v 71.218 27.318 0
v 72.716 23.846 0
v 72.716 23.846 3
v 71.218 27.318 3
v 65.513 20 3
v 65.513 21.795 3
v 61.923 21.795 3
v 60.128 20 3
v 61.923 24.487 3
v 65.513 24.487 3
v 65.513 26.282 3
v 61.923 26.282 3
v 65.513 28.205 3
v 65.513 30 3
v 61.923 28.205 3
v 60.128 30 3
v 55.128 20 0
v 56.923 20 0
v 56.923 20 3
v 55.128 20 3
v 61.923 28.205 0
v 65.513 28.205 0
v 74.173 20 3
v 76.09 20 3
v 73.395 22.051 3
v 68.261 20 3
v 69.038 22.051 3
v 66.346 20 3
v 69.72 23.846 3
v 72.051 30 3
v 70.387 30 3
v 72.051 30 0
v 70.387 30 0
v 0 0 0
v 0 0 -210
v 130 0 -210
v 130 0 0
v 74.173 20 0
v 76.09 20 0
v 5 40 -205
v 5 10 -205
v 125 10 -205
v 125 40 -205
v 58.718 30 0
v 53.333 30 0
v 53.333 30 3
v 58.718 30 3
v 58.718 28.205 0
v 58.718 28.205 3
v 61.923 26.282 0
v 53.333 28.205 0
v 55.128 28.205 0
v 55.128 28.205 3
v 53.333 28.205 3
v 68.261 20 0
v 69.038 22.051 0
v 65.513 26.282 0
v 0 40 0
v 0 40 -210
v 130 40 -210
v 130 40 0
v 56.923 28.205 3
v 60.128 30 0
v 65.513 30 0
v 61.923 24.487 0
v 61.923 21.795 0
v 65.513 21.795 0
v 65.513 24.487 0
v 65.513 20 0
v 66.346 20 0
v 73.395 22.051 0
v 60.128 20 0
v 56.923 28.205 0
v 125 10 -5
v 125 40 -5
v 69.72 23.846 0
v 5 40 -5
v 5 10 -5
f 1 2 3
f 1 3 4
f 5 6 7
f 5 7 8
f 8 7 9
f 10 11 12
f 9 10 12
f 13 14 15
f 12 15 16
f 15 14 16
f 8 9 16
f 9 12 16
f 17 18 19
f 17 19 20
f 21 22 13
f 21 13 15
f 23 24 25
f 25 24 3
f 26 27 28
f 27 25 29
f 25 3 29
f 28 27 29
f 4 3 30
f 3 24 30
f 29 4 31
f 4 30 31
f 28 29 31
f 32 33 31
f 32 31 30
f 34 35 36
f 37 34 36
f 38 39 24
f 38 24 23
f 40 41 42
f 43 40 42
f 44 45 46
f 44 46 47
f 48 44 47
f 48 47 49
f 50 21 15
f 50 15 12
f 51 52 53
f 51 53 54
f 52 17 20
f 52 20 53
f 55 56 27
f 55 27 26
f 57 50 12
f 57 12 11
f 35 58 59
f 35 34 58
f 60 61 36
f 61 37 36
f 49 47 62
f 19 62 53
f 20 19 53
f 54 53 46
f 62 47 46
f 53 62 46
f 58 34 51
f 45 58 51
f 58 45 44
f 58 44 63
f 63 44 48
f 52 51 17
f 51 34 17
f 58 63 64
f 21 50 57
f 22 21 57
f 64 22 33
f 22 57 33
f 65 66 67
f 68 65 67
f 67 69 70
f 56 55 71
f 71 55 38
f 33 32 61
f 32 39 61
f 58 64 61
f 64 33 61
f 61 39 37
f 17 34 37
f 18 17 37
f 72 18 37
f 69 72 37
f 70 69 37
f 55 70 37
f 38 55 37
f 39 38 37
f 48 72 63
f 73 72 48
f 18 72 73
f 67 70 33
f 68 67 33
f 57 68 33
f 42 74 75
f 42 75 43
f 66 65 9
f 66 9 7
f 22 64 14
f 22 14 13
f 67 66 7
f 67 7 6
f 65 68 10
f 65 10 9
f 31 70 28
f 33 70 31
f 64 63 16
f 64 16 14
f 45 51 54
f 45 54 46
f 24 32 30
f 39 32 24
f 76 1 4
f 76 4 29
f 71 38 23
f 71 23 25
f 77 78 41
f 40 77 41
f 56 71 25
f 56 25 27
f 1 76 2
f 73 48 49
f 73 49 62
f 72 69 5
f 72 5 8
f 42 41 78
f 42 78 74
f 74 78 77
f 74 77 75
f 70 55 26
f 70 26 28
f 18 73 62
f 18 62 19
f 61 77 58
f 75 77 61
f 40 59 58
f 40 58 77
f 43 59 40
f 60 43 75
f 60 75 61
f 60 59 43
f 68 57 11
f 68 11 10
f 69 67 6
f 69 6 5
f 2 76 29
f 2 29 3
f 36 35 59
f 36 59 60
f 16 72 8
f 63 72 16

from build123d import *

# Parameters (mm, degrees)
SKETCH1_W           = 130
SKETCH1_H           = 210
BOSS_EXTRUDE1_DEPTH = 10
SKETCH2_W           = 130
SKETCH2_H           = 210
SKETCH2_W_2         = 120
SKETCH2_H_2         = 200
BOSS_EXTRUDE2_DEPTH = 30
BOSS_EXTRUDE3_DEPTH = 3


with BuildPart() as part:
    # Sketch1 → Boss-Extrude1 (new body)
    with BuildSketch(Plane(origin=(0, 0, 0), x_dir=(1, 0, 0), z_dir=(0, 1, 0))):
        with Locations((65, 105)):
            Rectangle(SKETCH1_W, SKETCH1_H)
    extrude(amount=BOSS_EXTRUDE1_DEPTH)

    # Sketch2 → Boss-Extrude2 (add)
    with BuildSketch(Plane(origin=(0, 10, 0), x_dir=(1, 0, 0), z_dir=(0, 1, 0))):
        with Locations((65, 105)):
            Rectangle(SKETCH2_W, SKETCH2_H)
        with Locations((65, 105)):
            Rectangle(SKETCH2_W_2, SKETCH2_H_2, mode=Mode.SUBTRACT)
    extrude(amount=BOSS_EXTRUDE2_DEPTH)

    # Sketch3 → Boss-Extrude3 (add)
    # profile 1 of 3: a face of its own
    with BuildSketch(Plane.XY):
        Polygon((53.333333333, 30), (58.717948718, 30), (58.717948718, 28.205128205), (56.923076923, 28.205128205), (56.923076923, 20), (55.128205128, 20), (55.128205128, 28.205128205), (53.333333333, 28.205128205), align=None)
    # profile 2 of 3: a face of its own
    with BuildSketch(Plane.XY):
        Polygon((60.128205128, 30), (65.512820513, 30), (65.512820513, 28.205128205), (61.923076923, 28.205128205), (61.923076923, 26.282051282), (65.512820513, 26.282051282), (65.512820513, 24.487179487), (61.923076923, 24.487179487), (61.923076923, 21.794871795), (65.512820513, 21.794871795), (65.512820513, 20), (60.128205128, 20), align=None)
    # profile 3 of 3: a face of its own
    with BuildSketch(Plane.XY):
        Polygon((70.38661859, 30), (72.051282051, 30), (76.08974359, 20), (74.172676282, 20), (73.395432692, 22.051282051), (69.038461538, 22.051282051), (68.261217949, 20), (66.346153846, 20), align=None)
        Polygon((71.217948718, 27.317708333), (69.719551282, 23.846153846), (72.716346154, 23.846153846), align=None, mode=Mode.SUBTRACT)
    extrude(amount=BOSS_EXTRUDE3_DEPTH)


solid = part.part
